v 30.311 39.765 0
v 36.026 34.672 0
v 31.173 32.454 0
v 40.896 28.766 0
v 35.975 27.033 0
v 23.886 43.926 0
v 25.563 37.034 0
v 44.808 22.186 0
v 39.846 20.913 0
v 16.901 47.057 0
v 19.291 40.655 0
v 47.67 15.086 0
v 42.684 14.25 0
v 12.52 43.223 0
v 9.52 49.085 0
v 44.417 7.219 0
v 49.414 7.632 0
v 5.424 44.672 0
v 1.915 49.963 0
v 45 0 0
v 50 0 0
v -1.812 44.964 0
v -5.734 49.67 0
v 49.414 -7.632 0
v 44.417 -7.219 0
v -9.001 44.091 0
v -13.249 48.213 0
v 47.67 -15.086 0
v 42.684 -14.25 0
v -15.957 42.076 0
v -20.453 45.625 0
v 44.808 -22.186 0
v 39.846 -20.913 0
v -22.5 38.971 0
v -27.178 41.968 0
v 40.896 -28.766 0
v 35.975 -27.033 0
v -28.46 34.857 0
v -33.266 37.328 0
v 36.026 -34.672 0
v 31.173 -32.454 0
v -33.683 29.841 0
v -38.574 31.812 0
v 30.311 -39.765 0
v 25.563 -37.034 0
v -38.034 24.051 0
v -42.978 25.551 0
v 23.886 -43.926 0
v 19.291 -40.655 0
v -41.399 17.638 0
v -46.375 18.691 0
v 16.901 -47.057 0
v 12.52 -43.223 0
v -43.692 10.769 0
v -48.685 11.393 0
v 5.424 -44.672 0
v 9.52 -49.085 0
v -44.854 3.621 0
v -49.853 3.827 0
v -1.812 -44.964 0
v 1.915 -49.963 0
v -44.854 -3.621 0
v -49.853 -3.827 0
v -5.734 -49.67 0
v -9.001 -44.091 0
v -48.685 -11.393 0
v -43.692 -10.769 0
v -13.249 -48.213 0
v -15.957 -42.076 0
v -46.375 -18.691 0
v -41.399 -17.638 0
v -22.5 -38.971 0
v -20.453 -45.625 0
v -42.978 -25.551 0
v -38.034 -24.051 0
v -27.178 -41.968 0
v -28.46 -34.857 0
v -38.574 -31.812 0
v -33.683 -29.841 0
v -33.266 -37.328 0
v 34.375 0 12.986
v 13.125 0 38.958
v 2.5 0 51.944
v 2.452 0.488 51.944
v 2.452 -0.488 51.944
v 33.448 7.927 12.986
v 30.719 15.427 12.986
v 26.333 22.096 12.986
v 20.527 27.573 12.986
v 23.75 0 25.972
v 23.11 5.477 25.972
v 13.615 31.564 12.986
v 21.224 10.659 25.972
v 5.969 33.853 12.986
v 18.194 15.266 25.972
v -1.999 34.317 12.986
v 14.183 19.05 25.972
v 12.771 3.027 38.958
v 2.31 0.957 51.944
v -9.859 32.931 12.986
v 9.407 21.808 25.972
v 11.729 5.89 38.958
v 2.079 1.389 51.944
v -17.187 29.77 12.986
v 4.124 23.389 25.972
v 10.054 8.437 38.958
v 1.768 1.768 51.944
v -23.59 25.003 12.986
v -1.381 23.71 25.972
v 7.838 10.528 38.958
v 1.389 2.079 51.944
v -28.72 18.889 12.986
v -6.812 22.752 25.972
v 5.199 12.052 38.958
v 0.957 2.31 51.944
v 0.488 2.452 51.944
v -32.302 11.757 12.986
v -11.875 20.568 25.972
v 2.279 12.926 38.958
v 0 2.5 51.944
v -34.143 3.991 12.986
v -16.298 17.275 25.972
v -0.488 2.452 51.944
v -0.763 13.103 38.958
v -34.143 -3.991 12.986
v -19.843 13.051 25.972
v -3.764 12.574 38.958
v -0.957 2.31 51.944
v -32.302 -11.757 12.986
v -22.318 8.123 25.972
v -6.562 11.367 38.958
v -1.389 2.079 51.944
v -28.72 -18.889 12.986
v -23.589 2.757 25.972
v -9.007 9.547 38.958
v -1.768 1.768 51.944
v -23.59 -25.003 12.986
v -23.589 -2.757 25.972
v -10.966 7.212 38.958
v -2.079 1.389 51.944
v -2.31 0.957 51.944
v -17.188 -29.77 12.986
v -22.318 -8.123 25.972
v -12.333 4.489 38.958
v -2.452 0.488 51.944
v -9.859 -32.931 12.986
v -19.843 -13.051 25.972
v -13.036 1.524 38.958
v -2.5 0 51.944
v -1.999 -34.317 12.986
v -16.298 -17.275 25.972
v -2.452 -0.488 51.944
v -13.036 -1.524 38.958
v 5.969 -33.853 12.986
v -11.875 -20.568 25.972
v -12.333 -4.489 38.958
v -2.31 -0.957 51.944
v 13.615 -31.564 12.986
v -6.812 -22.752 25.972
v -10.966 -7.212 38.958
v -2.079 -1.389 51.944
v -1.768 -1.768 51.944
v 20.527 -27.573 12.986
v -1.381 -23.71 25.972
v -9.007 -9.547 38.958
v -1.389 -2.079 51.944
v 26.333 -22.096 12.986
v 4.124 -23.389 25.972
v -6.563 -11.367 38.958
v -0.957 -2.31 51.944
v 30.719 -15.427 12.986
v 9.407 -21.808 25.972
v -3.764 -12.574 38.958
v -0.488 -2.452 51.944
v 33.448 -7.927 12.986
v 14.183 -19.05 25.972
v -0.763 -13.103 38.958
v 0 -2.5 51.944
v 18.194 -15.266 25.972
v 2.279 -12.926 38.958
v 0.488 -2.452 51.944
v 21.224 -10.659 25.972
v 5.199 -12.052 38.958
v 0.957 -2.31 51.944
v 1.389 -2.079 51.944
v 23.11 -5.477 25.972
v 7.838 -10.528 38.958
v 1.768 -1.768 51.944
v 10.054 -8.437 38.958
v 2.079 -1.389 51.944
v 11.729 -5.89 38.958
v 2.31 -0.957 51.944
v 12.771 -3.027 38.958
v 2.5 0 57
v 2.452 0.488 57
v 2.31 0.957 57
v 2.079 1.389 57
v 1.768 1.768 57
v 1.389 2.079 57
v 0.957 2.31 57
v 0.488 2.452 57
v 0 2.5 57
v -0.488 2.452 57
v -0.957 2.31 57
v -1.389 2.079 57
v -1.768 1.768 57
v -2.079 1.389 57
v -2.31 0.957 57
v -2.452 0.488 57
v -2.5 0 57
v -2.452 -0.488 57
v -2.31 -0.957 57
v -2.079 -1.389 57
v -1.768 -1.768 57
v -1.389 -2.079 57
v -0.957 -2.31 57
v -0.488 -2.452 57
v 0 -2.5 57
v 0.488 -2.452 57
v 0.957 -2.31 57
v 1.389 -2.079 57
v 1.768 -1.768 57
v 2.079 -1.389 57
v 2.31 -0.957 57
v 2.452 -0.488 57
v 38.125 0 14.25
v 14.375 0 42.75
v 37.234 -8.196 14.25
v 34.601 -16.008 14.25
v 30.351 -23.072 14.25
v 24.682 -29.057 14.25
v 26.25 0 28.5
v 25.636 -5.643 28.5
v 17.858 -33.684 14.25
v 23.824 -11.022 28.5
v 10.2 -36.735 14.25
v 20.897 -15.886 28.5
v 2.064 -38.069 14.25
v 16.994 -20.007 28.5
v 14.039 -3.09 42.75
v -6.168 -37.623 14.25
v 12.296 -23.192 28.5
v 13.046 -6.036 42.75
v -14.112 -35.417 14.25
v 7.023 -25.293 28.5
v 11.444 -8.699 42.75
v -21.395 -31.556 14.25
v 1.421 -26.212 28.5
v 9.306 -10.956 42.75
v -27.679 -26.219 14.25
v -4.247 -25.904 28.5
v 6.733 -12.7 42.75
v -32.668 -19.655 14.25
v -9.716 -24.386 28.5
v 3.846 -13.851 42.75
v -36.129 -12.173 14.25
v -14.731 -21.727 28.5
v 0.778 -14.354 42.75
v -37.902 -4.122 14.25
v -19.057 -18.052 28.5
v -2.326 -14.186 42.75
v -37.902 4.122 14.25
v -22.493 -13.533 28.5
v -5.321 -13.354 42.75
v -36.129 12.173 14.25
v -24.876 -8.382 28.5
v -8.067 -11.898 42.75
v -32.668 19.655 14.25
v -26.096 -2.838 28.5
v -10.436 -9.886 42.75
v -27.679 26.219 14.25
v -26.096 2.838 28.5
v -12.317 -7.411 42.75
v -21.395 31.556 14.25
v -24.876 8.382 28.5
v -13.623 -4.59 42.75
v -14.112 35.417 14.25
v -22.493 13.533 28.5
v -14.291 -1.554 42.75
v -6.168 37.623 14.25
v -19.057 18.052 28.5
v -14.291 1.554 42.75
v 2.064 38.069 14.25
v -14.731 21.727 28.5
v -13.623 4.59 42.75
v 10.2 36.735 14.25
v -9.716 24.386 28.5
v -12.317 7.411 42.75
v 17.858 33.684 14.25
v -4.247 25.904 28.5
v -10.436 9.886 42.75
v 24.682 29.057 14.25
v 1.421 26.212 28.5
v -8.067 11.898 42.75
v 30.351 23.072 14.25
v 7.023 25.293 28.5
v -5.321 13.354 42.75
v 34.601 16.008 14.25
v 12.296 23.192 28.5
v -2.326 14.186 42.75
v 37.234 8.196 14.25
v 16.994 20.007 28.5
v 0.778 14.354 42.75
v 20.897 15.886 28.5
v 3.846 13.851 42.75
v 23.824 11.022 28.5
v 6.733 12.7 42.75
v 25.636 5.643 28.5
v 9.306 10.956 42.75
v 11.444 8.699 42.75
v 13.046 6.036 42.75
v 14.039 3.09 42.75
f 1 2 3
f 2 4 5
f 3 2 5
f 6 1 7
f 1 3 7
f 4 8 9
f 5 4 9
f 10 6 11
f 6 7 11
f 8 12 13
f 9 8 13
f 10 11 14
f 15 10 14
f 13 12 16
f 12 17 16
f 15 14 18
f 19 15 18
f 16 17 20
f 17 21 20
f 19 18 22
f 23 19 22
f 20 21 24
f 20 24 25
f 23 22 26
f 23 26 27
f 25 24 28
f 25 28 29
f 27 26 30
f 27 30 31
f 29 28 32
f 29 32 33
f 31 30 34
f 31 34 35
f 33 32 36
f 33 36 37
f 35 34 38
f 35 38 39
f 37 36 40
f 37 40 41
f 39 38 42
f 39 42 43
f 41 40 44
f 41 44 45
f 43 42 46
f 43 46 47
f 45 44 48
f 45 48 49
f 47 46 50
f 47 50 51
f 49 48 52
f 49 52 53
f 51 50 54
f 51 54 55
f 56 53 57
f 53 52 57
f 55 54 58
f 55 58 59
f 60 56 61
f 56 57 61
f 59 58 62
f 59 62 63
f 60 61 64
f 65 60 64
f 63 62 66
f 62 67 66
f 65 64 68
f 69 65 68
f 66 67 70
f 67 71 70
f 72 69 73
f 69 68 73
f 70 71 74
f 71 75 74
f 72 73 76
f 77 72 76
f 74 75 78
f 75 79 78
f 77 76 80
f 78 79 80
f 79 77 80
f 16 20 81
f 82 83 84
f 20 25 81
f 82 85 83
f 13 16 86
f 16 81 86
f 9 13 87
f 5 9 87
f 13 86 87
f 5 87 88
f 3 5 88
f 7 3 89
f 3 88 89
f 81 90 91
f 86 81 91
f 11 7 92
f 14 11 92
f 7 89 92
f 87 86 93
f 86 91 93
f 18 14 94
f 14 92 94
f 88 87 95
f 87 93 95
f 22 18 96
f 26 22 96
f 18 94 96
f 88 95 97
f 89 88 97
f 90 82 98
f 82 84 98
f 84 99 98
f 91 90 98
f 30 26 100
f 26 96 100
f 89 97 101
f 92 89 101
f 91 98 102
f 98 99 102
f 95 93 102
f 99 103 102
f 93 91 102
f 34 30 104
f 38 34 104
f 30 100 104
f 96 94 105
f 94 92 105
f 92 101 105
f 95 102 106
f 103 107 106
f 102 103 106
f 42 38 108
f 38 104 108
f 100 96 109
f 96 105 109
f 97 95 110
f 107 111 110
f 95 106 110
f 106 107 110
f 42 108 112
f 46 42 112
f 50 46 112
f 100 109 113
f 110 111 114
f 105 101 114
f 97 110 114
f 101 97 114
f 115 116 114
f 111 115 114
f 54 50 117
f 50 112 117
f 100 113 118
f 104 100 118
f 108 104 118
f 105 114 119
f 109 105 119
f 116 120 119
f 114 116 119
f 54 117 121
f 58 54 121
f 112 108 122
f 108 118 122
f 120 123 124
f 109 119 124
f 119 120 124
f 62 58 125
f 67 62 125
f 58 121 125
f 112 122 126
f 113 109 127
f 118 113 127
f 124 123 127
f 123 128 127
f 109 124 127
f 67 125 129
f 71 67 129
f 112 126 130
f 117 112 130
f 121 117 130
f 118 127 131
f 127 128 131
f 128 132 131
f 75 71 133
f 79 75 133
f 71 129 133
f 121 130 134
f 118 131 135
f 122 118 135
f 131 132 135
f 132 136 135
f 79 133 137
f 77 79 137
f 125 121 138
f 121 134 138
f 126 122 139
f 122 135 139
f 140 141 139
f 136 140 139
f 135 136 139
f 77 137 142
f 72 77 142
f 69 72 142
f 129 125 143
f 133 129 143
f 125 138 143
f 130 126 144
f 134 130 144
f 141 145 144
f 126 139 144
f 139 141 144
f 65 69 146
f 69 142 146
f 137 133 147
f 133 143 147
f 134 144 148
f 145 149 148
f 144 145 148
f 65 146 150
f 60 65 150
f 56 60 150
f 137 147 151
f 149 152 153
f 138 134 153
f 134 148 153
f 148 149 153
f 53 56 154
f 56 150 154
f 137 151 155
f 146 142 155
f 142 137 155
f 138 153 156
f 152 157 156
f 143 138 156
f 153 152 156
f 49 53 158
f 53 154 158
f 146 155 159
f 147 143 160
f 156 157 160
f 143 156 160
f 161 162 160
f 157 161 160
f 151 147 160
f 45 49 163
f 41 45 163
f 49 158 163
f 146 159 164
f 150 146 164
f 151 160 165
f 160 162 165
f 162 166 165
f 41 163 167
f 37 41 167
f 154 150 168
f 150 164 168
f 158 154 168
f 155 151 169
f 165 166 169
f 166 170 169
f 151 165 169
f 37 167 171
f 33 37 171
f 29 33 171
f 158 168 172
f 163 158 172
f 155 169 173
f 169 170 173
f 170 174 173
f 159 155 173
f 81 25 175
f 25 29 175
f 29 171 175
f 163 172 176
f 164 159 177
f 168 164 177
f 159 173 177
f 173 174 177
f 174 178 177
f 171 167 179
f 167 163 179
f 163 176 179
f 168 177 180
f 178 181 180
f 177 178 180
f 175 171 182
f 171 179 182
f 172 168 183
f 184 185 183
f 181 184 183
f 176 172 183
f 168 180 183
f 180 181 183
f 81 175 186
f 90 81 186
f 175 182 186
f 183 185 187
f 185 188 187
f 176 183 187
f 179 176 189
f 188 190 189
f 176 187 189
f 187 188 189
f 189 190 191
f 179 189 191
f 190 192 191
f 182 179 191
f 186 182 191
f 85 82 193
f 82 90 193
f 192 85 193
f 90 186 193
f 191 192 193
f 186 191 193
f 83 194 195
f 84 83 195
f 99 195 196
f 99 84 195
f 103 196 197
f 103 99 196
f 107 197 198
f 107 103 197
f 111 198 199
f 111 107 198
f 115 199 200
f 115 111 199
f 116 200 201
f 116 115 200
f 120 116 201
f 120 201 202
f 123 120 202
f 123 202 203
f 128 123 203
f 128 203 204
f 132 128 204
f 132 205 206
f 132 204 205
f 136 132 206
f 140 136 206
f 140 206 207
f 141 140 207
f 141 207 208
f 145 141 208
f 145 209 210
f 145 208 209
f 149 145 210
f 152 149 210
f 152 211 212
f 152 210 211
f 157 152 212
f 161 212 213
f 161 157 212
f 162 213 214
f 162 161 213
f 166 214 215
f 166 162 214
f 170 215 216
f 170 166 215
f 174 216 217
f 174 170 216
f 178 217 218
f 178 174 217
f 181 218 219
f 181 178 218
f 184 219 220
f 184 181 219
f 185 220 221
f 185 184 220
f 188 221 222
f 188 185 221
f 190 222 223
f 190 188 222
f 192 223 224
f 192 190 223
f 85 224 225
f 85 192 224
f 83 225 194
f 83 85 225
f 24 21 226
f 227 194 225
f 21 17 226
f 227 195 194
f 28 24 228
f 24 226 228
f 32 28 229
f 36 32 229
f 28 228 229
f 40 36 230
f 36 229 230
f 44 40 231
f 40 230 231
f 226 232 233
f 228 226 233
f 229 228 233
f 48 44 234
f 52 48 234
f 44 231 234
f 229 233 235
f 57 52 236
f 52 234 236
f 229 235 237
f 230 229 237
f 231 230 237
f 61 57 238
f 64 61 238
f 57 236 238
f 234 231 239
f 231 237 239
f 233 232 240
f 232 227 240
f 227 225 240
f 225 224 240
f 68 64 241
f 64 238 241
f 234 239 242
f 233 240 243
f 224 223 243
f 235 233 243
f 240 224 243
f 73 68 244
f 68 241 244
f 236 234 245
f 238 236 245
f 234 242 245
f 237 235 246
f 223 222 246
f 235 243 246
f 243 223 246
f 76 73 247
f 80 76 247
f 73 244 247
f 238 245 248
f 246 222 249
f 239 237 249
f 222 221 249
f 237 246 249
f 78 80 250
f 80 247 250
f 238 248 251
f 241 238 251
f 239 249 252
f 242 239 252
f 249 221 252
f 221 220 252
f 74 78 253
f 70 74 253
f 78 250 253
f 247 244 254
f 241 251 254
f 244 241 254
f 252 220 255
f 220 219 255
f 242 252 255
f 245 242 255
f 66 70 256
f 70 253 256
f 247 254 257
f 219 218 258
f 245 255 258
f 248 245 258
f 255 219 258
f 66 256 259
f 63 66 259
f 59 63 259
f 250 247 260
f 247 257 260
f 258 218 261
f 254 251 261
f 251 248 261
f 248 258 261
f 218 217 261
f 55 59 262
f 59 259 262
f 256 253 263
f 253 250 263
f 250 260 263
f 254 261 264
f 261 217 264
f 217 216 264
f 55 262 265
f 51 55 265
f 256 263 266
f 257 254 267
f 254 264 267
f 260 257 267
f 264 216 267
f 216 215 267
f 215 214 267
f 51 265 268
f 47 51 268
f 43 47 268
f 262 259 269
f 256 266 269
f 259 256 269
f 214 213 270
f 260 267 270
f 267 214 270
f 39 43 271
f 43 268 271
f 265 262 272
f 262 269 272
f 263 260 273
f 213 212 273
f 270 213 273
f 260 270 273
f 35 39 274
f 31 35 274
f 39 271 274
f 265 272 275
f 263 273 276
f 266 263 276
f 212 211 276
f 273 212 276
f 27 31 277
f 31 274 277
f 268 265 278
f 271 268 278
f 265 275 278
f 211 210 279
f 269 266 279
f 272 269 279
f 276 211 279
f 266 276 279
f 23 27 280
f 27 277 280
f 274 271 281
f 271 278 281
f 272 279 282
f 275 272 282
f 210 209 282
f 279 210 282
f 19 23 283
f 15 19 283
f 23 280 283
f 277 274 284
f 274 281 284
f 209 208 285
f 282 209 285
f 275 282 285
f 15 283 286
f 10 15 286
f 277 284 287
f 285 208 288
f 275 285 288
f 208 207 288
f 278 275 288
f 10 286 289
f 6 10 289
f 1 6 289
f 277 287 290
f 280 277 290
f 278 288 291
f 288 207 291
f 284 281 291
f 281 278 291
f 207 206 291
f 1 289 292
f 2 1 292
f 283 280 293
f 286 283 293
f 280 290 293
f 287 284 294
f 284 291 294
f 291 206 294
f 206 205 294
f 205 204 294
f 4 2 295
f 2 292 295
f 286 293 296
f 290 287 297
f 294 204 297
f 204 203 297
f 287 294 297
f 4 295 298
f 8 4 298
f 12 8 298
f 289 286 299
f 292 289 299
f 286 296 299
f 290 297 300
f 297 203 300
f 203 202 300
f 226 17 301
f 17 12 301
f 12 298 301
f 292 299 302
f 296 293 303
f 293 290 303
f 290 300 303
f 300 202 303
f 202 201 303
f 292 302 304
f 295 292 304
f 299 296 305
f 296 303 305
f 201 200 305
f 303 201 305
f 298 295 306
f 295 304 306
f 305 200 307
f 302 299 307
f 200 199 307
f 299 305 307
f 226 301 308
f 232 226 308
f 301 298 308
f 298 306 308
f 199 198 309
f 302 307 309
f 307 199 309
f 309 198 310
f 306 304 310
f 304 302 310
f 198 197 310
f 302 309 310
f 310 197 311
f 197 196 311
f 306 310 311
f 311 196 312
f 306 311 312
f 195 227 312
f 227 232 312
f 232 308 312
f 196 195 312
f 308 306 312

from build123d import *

# Parameters (mm, degrees)
F2_R     = 2.5
F3_DEPTH = 60


with BuildPart() as f1:
    # F0 (on Front) → F1 (revolve)
    with BuildSketch(Plane.XZ):
        Polygon((50, 0), (0, 60), (0, 0), align=None)
    revolve(axis=Axis((0, 0, 30), (0, 0, -1)))

    # F2 (on Top) → F3 (cut)
    with BuildSketch(Plane.XY):
        Circle(F2_R)
    extrude(amount=F3_DEPTH, mode=Mode.SUBTRACT)

    # F4 (on Front) → F5 (revolve, cut)
    with BuildSketch(Plane.XZ):
        Polygon((0, 55), (0, 0), (45, 0), align=None)
    revolve(axis=Axis((0, 0, 27.5), (0, 0, 1)), mode=Mode.SUBTRACT)


solid = f1.part
